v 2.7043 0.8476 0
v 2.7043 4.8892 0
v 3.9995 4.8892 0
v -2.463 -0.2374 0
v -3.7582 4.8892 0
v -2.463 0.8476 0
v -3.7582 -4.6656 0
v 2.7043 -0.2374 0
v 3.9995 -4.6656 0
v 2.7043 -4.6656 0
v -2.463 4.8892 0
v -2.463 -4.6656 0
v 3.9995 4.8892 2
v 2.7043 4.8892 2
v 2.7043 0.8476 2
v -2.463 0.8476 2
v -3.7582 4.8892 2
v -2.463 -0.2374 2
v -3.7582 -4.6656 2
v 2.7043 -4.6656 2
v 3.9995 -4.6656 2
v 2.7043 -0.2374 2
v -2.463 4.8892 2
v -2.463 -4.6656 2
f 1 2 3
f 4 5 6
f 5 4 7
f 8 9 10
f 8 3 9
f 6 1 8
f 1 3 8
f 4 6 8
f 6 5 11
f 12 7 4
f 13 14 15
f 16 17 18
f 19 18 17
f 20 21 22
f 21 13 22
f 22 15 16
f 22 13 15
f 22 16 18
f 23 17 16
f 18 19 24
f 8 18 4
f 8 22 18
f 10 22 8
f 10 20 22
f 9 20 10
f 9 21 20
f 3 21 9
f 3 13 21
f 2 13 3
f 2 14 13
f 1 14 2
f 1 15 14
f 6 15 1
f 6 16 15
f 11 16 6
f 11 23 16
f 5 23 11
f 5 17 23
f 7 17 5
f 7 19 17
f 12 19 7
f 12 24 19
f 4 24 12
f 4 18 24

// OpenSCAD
linear_extrude(height=2)
  text("H", font="Liberation Sans:style=Regular", size=10, halign="center", valign="center", spacing=1);
